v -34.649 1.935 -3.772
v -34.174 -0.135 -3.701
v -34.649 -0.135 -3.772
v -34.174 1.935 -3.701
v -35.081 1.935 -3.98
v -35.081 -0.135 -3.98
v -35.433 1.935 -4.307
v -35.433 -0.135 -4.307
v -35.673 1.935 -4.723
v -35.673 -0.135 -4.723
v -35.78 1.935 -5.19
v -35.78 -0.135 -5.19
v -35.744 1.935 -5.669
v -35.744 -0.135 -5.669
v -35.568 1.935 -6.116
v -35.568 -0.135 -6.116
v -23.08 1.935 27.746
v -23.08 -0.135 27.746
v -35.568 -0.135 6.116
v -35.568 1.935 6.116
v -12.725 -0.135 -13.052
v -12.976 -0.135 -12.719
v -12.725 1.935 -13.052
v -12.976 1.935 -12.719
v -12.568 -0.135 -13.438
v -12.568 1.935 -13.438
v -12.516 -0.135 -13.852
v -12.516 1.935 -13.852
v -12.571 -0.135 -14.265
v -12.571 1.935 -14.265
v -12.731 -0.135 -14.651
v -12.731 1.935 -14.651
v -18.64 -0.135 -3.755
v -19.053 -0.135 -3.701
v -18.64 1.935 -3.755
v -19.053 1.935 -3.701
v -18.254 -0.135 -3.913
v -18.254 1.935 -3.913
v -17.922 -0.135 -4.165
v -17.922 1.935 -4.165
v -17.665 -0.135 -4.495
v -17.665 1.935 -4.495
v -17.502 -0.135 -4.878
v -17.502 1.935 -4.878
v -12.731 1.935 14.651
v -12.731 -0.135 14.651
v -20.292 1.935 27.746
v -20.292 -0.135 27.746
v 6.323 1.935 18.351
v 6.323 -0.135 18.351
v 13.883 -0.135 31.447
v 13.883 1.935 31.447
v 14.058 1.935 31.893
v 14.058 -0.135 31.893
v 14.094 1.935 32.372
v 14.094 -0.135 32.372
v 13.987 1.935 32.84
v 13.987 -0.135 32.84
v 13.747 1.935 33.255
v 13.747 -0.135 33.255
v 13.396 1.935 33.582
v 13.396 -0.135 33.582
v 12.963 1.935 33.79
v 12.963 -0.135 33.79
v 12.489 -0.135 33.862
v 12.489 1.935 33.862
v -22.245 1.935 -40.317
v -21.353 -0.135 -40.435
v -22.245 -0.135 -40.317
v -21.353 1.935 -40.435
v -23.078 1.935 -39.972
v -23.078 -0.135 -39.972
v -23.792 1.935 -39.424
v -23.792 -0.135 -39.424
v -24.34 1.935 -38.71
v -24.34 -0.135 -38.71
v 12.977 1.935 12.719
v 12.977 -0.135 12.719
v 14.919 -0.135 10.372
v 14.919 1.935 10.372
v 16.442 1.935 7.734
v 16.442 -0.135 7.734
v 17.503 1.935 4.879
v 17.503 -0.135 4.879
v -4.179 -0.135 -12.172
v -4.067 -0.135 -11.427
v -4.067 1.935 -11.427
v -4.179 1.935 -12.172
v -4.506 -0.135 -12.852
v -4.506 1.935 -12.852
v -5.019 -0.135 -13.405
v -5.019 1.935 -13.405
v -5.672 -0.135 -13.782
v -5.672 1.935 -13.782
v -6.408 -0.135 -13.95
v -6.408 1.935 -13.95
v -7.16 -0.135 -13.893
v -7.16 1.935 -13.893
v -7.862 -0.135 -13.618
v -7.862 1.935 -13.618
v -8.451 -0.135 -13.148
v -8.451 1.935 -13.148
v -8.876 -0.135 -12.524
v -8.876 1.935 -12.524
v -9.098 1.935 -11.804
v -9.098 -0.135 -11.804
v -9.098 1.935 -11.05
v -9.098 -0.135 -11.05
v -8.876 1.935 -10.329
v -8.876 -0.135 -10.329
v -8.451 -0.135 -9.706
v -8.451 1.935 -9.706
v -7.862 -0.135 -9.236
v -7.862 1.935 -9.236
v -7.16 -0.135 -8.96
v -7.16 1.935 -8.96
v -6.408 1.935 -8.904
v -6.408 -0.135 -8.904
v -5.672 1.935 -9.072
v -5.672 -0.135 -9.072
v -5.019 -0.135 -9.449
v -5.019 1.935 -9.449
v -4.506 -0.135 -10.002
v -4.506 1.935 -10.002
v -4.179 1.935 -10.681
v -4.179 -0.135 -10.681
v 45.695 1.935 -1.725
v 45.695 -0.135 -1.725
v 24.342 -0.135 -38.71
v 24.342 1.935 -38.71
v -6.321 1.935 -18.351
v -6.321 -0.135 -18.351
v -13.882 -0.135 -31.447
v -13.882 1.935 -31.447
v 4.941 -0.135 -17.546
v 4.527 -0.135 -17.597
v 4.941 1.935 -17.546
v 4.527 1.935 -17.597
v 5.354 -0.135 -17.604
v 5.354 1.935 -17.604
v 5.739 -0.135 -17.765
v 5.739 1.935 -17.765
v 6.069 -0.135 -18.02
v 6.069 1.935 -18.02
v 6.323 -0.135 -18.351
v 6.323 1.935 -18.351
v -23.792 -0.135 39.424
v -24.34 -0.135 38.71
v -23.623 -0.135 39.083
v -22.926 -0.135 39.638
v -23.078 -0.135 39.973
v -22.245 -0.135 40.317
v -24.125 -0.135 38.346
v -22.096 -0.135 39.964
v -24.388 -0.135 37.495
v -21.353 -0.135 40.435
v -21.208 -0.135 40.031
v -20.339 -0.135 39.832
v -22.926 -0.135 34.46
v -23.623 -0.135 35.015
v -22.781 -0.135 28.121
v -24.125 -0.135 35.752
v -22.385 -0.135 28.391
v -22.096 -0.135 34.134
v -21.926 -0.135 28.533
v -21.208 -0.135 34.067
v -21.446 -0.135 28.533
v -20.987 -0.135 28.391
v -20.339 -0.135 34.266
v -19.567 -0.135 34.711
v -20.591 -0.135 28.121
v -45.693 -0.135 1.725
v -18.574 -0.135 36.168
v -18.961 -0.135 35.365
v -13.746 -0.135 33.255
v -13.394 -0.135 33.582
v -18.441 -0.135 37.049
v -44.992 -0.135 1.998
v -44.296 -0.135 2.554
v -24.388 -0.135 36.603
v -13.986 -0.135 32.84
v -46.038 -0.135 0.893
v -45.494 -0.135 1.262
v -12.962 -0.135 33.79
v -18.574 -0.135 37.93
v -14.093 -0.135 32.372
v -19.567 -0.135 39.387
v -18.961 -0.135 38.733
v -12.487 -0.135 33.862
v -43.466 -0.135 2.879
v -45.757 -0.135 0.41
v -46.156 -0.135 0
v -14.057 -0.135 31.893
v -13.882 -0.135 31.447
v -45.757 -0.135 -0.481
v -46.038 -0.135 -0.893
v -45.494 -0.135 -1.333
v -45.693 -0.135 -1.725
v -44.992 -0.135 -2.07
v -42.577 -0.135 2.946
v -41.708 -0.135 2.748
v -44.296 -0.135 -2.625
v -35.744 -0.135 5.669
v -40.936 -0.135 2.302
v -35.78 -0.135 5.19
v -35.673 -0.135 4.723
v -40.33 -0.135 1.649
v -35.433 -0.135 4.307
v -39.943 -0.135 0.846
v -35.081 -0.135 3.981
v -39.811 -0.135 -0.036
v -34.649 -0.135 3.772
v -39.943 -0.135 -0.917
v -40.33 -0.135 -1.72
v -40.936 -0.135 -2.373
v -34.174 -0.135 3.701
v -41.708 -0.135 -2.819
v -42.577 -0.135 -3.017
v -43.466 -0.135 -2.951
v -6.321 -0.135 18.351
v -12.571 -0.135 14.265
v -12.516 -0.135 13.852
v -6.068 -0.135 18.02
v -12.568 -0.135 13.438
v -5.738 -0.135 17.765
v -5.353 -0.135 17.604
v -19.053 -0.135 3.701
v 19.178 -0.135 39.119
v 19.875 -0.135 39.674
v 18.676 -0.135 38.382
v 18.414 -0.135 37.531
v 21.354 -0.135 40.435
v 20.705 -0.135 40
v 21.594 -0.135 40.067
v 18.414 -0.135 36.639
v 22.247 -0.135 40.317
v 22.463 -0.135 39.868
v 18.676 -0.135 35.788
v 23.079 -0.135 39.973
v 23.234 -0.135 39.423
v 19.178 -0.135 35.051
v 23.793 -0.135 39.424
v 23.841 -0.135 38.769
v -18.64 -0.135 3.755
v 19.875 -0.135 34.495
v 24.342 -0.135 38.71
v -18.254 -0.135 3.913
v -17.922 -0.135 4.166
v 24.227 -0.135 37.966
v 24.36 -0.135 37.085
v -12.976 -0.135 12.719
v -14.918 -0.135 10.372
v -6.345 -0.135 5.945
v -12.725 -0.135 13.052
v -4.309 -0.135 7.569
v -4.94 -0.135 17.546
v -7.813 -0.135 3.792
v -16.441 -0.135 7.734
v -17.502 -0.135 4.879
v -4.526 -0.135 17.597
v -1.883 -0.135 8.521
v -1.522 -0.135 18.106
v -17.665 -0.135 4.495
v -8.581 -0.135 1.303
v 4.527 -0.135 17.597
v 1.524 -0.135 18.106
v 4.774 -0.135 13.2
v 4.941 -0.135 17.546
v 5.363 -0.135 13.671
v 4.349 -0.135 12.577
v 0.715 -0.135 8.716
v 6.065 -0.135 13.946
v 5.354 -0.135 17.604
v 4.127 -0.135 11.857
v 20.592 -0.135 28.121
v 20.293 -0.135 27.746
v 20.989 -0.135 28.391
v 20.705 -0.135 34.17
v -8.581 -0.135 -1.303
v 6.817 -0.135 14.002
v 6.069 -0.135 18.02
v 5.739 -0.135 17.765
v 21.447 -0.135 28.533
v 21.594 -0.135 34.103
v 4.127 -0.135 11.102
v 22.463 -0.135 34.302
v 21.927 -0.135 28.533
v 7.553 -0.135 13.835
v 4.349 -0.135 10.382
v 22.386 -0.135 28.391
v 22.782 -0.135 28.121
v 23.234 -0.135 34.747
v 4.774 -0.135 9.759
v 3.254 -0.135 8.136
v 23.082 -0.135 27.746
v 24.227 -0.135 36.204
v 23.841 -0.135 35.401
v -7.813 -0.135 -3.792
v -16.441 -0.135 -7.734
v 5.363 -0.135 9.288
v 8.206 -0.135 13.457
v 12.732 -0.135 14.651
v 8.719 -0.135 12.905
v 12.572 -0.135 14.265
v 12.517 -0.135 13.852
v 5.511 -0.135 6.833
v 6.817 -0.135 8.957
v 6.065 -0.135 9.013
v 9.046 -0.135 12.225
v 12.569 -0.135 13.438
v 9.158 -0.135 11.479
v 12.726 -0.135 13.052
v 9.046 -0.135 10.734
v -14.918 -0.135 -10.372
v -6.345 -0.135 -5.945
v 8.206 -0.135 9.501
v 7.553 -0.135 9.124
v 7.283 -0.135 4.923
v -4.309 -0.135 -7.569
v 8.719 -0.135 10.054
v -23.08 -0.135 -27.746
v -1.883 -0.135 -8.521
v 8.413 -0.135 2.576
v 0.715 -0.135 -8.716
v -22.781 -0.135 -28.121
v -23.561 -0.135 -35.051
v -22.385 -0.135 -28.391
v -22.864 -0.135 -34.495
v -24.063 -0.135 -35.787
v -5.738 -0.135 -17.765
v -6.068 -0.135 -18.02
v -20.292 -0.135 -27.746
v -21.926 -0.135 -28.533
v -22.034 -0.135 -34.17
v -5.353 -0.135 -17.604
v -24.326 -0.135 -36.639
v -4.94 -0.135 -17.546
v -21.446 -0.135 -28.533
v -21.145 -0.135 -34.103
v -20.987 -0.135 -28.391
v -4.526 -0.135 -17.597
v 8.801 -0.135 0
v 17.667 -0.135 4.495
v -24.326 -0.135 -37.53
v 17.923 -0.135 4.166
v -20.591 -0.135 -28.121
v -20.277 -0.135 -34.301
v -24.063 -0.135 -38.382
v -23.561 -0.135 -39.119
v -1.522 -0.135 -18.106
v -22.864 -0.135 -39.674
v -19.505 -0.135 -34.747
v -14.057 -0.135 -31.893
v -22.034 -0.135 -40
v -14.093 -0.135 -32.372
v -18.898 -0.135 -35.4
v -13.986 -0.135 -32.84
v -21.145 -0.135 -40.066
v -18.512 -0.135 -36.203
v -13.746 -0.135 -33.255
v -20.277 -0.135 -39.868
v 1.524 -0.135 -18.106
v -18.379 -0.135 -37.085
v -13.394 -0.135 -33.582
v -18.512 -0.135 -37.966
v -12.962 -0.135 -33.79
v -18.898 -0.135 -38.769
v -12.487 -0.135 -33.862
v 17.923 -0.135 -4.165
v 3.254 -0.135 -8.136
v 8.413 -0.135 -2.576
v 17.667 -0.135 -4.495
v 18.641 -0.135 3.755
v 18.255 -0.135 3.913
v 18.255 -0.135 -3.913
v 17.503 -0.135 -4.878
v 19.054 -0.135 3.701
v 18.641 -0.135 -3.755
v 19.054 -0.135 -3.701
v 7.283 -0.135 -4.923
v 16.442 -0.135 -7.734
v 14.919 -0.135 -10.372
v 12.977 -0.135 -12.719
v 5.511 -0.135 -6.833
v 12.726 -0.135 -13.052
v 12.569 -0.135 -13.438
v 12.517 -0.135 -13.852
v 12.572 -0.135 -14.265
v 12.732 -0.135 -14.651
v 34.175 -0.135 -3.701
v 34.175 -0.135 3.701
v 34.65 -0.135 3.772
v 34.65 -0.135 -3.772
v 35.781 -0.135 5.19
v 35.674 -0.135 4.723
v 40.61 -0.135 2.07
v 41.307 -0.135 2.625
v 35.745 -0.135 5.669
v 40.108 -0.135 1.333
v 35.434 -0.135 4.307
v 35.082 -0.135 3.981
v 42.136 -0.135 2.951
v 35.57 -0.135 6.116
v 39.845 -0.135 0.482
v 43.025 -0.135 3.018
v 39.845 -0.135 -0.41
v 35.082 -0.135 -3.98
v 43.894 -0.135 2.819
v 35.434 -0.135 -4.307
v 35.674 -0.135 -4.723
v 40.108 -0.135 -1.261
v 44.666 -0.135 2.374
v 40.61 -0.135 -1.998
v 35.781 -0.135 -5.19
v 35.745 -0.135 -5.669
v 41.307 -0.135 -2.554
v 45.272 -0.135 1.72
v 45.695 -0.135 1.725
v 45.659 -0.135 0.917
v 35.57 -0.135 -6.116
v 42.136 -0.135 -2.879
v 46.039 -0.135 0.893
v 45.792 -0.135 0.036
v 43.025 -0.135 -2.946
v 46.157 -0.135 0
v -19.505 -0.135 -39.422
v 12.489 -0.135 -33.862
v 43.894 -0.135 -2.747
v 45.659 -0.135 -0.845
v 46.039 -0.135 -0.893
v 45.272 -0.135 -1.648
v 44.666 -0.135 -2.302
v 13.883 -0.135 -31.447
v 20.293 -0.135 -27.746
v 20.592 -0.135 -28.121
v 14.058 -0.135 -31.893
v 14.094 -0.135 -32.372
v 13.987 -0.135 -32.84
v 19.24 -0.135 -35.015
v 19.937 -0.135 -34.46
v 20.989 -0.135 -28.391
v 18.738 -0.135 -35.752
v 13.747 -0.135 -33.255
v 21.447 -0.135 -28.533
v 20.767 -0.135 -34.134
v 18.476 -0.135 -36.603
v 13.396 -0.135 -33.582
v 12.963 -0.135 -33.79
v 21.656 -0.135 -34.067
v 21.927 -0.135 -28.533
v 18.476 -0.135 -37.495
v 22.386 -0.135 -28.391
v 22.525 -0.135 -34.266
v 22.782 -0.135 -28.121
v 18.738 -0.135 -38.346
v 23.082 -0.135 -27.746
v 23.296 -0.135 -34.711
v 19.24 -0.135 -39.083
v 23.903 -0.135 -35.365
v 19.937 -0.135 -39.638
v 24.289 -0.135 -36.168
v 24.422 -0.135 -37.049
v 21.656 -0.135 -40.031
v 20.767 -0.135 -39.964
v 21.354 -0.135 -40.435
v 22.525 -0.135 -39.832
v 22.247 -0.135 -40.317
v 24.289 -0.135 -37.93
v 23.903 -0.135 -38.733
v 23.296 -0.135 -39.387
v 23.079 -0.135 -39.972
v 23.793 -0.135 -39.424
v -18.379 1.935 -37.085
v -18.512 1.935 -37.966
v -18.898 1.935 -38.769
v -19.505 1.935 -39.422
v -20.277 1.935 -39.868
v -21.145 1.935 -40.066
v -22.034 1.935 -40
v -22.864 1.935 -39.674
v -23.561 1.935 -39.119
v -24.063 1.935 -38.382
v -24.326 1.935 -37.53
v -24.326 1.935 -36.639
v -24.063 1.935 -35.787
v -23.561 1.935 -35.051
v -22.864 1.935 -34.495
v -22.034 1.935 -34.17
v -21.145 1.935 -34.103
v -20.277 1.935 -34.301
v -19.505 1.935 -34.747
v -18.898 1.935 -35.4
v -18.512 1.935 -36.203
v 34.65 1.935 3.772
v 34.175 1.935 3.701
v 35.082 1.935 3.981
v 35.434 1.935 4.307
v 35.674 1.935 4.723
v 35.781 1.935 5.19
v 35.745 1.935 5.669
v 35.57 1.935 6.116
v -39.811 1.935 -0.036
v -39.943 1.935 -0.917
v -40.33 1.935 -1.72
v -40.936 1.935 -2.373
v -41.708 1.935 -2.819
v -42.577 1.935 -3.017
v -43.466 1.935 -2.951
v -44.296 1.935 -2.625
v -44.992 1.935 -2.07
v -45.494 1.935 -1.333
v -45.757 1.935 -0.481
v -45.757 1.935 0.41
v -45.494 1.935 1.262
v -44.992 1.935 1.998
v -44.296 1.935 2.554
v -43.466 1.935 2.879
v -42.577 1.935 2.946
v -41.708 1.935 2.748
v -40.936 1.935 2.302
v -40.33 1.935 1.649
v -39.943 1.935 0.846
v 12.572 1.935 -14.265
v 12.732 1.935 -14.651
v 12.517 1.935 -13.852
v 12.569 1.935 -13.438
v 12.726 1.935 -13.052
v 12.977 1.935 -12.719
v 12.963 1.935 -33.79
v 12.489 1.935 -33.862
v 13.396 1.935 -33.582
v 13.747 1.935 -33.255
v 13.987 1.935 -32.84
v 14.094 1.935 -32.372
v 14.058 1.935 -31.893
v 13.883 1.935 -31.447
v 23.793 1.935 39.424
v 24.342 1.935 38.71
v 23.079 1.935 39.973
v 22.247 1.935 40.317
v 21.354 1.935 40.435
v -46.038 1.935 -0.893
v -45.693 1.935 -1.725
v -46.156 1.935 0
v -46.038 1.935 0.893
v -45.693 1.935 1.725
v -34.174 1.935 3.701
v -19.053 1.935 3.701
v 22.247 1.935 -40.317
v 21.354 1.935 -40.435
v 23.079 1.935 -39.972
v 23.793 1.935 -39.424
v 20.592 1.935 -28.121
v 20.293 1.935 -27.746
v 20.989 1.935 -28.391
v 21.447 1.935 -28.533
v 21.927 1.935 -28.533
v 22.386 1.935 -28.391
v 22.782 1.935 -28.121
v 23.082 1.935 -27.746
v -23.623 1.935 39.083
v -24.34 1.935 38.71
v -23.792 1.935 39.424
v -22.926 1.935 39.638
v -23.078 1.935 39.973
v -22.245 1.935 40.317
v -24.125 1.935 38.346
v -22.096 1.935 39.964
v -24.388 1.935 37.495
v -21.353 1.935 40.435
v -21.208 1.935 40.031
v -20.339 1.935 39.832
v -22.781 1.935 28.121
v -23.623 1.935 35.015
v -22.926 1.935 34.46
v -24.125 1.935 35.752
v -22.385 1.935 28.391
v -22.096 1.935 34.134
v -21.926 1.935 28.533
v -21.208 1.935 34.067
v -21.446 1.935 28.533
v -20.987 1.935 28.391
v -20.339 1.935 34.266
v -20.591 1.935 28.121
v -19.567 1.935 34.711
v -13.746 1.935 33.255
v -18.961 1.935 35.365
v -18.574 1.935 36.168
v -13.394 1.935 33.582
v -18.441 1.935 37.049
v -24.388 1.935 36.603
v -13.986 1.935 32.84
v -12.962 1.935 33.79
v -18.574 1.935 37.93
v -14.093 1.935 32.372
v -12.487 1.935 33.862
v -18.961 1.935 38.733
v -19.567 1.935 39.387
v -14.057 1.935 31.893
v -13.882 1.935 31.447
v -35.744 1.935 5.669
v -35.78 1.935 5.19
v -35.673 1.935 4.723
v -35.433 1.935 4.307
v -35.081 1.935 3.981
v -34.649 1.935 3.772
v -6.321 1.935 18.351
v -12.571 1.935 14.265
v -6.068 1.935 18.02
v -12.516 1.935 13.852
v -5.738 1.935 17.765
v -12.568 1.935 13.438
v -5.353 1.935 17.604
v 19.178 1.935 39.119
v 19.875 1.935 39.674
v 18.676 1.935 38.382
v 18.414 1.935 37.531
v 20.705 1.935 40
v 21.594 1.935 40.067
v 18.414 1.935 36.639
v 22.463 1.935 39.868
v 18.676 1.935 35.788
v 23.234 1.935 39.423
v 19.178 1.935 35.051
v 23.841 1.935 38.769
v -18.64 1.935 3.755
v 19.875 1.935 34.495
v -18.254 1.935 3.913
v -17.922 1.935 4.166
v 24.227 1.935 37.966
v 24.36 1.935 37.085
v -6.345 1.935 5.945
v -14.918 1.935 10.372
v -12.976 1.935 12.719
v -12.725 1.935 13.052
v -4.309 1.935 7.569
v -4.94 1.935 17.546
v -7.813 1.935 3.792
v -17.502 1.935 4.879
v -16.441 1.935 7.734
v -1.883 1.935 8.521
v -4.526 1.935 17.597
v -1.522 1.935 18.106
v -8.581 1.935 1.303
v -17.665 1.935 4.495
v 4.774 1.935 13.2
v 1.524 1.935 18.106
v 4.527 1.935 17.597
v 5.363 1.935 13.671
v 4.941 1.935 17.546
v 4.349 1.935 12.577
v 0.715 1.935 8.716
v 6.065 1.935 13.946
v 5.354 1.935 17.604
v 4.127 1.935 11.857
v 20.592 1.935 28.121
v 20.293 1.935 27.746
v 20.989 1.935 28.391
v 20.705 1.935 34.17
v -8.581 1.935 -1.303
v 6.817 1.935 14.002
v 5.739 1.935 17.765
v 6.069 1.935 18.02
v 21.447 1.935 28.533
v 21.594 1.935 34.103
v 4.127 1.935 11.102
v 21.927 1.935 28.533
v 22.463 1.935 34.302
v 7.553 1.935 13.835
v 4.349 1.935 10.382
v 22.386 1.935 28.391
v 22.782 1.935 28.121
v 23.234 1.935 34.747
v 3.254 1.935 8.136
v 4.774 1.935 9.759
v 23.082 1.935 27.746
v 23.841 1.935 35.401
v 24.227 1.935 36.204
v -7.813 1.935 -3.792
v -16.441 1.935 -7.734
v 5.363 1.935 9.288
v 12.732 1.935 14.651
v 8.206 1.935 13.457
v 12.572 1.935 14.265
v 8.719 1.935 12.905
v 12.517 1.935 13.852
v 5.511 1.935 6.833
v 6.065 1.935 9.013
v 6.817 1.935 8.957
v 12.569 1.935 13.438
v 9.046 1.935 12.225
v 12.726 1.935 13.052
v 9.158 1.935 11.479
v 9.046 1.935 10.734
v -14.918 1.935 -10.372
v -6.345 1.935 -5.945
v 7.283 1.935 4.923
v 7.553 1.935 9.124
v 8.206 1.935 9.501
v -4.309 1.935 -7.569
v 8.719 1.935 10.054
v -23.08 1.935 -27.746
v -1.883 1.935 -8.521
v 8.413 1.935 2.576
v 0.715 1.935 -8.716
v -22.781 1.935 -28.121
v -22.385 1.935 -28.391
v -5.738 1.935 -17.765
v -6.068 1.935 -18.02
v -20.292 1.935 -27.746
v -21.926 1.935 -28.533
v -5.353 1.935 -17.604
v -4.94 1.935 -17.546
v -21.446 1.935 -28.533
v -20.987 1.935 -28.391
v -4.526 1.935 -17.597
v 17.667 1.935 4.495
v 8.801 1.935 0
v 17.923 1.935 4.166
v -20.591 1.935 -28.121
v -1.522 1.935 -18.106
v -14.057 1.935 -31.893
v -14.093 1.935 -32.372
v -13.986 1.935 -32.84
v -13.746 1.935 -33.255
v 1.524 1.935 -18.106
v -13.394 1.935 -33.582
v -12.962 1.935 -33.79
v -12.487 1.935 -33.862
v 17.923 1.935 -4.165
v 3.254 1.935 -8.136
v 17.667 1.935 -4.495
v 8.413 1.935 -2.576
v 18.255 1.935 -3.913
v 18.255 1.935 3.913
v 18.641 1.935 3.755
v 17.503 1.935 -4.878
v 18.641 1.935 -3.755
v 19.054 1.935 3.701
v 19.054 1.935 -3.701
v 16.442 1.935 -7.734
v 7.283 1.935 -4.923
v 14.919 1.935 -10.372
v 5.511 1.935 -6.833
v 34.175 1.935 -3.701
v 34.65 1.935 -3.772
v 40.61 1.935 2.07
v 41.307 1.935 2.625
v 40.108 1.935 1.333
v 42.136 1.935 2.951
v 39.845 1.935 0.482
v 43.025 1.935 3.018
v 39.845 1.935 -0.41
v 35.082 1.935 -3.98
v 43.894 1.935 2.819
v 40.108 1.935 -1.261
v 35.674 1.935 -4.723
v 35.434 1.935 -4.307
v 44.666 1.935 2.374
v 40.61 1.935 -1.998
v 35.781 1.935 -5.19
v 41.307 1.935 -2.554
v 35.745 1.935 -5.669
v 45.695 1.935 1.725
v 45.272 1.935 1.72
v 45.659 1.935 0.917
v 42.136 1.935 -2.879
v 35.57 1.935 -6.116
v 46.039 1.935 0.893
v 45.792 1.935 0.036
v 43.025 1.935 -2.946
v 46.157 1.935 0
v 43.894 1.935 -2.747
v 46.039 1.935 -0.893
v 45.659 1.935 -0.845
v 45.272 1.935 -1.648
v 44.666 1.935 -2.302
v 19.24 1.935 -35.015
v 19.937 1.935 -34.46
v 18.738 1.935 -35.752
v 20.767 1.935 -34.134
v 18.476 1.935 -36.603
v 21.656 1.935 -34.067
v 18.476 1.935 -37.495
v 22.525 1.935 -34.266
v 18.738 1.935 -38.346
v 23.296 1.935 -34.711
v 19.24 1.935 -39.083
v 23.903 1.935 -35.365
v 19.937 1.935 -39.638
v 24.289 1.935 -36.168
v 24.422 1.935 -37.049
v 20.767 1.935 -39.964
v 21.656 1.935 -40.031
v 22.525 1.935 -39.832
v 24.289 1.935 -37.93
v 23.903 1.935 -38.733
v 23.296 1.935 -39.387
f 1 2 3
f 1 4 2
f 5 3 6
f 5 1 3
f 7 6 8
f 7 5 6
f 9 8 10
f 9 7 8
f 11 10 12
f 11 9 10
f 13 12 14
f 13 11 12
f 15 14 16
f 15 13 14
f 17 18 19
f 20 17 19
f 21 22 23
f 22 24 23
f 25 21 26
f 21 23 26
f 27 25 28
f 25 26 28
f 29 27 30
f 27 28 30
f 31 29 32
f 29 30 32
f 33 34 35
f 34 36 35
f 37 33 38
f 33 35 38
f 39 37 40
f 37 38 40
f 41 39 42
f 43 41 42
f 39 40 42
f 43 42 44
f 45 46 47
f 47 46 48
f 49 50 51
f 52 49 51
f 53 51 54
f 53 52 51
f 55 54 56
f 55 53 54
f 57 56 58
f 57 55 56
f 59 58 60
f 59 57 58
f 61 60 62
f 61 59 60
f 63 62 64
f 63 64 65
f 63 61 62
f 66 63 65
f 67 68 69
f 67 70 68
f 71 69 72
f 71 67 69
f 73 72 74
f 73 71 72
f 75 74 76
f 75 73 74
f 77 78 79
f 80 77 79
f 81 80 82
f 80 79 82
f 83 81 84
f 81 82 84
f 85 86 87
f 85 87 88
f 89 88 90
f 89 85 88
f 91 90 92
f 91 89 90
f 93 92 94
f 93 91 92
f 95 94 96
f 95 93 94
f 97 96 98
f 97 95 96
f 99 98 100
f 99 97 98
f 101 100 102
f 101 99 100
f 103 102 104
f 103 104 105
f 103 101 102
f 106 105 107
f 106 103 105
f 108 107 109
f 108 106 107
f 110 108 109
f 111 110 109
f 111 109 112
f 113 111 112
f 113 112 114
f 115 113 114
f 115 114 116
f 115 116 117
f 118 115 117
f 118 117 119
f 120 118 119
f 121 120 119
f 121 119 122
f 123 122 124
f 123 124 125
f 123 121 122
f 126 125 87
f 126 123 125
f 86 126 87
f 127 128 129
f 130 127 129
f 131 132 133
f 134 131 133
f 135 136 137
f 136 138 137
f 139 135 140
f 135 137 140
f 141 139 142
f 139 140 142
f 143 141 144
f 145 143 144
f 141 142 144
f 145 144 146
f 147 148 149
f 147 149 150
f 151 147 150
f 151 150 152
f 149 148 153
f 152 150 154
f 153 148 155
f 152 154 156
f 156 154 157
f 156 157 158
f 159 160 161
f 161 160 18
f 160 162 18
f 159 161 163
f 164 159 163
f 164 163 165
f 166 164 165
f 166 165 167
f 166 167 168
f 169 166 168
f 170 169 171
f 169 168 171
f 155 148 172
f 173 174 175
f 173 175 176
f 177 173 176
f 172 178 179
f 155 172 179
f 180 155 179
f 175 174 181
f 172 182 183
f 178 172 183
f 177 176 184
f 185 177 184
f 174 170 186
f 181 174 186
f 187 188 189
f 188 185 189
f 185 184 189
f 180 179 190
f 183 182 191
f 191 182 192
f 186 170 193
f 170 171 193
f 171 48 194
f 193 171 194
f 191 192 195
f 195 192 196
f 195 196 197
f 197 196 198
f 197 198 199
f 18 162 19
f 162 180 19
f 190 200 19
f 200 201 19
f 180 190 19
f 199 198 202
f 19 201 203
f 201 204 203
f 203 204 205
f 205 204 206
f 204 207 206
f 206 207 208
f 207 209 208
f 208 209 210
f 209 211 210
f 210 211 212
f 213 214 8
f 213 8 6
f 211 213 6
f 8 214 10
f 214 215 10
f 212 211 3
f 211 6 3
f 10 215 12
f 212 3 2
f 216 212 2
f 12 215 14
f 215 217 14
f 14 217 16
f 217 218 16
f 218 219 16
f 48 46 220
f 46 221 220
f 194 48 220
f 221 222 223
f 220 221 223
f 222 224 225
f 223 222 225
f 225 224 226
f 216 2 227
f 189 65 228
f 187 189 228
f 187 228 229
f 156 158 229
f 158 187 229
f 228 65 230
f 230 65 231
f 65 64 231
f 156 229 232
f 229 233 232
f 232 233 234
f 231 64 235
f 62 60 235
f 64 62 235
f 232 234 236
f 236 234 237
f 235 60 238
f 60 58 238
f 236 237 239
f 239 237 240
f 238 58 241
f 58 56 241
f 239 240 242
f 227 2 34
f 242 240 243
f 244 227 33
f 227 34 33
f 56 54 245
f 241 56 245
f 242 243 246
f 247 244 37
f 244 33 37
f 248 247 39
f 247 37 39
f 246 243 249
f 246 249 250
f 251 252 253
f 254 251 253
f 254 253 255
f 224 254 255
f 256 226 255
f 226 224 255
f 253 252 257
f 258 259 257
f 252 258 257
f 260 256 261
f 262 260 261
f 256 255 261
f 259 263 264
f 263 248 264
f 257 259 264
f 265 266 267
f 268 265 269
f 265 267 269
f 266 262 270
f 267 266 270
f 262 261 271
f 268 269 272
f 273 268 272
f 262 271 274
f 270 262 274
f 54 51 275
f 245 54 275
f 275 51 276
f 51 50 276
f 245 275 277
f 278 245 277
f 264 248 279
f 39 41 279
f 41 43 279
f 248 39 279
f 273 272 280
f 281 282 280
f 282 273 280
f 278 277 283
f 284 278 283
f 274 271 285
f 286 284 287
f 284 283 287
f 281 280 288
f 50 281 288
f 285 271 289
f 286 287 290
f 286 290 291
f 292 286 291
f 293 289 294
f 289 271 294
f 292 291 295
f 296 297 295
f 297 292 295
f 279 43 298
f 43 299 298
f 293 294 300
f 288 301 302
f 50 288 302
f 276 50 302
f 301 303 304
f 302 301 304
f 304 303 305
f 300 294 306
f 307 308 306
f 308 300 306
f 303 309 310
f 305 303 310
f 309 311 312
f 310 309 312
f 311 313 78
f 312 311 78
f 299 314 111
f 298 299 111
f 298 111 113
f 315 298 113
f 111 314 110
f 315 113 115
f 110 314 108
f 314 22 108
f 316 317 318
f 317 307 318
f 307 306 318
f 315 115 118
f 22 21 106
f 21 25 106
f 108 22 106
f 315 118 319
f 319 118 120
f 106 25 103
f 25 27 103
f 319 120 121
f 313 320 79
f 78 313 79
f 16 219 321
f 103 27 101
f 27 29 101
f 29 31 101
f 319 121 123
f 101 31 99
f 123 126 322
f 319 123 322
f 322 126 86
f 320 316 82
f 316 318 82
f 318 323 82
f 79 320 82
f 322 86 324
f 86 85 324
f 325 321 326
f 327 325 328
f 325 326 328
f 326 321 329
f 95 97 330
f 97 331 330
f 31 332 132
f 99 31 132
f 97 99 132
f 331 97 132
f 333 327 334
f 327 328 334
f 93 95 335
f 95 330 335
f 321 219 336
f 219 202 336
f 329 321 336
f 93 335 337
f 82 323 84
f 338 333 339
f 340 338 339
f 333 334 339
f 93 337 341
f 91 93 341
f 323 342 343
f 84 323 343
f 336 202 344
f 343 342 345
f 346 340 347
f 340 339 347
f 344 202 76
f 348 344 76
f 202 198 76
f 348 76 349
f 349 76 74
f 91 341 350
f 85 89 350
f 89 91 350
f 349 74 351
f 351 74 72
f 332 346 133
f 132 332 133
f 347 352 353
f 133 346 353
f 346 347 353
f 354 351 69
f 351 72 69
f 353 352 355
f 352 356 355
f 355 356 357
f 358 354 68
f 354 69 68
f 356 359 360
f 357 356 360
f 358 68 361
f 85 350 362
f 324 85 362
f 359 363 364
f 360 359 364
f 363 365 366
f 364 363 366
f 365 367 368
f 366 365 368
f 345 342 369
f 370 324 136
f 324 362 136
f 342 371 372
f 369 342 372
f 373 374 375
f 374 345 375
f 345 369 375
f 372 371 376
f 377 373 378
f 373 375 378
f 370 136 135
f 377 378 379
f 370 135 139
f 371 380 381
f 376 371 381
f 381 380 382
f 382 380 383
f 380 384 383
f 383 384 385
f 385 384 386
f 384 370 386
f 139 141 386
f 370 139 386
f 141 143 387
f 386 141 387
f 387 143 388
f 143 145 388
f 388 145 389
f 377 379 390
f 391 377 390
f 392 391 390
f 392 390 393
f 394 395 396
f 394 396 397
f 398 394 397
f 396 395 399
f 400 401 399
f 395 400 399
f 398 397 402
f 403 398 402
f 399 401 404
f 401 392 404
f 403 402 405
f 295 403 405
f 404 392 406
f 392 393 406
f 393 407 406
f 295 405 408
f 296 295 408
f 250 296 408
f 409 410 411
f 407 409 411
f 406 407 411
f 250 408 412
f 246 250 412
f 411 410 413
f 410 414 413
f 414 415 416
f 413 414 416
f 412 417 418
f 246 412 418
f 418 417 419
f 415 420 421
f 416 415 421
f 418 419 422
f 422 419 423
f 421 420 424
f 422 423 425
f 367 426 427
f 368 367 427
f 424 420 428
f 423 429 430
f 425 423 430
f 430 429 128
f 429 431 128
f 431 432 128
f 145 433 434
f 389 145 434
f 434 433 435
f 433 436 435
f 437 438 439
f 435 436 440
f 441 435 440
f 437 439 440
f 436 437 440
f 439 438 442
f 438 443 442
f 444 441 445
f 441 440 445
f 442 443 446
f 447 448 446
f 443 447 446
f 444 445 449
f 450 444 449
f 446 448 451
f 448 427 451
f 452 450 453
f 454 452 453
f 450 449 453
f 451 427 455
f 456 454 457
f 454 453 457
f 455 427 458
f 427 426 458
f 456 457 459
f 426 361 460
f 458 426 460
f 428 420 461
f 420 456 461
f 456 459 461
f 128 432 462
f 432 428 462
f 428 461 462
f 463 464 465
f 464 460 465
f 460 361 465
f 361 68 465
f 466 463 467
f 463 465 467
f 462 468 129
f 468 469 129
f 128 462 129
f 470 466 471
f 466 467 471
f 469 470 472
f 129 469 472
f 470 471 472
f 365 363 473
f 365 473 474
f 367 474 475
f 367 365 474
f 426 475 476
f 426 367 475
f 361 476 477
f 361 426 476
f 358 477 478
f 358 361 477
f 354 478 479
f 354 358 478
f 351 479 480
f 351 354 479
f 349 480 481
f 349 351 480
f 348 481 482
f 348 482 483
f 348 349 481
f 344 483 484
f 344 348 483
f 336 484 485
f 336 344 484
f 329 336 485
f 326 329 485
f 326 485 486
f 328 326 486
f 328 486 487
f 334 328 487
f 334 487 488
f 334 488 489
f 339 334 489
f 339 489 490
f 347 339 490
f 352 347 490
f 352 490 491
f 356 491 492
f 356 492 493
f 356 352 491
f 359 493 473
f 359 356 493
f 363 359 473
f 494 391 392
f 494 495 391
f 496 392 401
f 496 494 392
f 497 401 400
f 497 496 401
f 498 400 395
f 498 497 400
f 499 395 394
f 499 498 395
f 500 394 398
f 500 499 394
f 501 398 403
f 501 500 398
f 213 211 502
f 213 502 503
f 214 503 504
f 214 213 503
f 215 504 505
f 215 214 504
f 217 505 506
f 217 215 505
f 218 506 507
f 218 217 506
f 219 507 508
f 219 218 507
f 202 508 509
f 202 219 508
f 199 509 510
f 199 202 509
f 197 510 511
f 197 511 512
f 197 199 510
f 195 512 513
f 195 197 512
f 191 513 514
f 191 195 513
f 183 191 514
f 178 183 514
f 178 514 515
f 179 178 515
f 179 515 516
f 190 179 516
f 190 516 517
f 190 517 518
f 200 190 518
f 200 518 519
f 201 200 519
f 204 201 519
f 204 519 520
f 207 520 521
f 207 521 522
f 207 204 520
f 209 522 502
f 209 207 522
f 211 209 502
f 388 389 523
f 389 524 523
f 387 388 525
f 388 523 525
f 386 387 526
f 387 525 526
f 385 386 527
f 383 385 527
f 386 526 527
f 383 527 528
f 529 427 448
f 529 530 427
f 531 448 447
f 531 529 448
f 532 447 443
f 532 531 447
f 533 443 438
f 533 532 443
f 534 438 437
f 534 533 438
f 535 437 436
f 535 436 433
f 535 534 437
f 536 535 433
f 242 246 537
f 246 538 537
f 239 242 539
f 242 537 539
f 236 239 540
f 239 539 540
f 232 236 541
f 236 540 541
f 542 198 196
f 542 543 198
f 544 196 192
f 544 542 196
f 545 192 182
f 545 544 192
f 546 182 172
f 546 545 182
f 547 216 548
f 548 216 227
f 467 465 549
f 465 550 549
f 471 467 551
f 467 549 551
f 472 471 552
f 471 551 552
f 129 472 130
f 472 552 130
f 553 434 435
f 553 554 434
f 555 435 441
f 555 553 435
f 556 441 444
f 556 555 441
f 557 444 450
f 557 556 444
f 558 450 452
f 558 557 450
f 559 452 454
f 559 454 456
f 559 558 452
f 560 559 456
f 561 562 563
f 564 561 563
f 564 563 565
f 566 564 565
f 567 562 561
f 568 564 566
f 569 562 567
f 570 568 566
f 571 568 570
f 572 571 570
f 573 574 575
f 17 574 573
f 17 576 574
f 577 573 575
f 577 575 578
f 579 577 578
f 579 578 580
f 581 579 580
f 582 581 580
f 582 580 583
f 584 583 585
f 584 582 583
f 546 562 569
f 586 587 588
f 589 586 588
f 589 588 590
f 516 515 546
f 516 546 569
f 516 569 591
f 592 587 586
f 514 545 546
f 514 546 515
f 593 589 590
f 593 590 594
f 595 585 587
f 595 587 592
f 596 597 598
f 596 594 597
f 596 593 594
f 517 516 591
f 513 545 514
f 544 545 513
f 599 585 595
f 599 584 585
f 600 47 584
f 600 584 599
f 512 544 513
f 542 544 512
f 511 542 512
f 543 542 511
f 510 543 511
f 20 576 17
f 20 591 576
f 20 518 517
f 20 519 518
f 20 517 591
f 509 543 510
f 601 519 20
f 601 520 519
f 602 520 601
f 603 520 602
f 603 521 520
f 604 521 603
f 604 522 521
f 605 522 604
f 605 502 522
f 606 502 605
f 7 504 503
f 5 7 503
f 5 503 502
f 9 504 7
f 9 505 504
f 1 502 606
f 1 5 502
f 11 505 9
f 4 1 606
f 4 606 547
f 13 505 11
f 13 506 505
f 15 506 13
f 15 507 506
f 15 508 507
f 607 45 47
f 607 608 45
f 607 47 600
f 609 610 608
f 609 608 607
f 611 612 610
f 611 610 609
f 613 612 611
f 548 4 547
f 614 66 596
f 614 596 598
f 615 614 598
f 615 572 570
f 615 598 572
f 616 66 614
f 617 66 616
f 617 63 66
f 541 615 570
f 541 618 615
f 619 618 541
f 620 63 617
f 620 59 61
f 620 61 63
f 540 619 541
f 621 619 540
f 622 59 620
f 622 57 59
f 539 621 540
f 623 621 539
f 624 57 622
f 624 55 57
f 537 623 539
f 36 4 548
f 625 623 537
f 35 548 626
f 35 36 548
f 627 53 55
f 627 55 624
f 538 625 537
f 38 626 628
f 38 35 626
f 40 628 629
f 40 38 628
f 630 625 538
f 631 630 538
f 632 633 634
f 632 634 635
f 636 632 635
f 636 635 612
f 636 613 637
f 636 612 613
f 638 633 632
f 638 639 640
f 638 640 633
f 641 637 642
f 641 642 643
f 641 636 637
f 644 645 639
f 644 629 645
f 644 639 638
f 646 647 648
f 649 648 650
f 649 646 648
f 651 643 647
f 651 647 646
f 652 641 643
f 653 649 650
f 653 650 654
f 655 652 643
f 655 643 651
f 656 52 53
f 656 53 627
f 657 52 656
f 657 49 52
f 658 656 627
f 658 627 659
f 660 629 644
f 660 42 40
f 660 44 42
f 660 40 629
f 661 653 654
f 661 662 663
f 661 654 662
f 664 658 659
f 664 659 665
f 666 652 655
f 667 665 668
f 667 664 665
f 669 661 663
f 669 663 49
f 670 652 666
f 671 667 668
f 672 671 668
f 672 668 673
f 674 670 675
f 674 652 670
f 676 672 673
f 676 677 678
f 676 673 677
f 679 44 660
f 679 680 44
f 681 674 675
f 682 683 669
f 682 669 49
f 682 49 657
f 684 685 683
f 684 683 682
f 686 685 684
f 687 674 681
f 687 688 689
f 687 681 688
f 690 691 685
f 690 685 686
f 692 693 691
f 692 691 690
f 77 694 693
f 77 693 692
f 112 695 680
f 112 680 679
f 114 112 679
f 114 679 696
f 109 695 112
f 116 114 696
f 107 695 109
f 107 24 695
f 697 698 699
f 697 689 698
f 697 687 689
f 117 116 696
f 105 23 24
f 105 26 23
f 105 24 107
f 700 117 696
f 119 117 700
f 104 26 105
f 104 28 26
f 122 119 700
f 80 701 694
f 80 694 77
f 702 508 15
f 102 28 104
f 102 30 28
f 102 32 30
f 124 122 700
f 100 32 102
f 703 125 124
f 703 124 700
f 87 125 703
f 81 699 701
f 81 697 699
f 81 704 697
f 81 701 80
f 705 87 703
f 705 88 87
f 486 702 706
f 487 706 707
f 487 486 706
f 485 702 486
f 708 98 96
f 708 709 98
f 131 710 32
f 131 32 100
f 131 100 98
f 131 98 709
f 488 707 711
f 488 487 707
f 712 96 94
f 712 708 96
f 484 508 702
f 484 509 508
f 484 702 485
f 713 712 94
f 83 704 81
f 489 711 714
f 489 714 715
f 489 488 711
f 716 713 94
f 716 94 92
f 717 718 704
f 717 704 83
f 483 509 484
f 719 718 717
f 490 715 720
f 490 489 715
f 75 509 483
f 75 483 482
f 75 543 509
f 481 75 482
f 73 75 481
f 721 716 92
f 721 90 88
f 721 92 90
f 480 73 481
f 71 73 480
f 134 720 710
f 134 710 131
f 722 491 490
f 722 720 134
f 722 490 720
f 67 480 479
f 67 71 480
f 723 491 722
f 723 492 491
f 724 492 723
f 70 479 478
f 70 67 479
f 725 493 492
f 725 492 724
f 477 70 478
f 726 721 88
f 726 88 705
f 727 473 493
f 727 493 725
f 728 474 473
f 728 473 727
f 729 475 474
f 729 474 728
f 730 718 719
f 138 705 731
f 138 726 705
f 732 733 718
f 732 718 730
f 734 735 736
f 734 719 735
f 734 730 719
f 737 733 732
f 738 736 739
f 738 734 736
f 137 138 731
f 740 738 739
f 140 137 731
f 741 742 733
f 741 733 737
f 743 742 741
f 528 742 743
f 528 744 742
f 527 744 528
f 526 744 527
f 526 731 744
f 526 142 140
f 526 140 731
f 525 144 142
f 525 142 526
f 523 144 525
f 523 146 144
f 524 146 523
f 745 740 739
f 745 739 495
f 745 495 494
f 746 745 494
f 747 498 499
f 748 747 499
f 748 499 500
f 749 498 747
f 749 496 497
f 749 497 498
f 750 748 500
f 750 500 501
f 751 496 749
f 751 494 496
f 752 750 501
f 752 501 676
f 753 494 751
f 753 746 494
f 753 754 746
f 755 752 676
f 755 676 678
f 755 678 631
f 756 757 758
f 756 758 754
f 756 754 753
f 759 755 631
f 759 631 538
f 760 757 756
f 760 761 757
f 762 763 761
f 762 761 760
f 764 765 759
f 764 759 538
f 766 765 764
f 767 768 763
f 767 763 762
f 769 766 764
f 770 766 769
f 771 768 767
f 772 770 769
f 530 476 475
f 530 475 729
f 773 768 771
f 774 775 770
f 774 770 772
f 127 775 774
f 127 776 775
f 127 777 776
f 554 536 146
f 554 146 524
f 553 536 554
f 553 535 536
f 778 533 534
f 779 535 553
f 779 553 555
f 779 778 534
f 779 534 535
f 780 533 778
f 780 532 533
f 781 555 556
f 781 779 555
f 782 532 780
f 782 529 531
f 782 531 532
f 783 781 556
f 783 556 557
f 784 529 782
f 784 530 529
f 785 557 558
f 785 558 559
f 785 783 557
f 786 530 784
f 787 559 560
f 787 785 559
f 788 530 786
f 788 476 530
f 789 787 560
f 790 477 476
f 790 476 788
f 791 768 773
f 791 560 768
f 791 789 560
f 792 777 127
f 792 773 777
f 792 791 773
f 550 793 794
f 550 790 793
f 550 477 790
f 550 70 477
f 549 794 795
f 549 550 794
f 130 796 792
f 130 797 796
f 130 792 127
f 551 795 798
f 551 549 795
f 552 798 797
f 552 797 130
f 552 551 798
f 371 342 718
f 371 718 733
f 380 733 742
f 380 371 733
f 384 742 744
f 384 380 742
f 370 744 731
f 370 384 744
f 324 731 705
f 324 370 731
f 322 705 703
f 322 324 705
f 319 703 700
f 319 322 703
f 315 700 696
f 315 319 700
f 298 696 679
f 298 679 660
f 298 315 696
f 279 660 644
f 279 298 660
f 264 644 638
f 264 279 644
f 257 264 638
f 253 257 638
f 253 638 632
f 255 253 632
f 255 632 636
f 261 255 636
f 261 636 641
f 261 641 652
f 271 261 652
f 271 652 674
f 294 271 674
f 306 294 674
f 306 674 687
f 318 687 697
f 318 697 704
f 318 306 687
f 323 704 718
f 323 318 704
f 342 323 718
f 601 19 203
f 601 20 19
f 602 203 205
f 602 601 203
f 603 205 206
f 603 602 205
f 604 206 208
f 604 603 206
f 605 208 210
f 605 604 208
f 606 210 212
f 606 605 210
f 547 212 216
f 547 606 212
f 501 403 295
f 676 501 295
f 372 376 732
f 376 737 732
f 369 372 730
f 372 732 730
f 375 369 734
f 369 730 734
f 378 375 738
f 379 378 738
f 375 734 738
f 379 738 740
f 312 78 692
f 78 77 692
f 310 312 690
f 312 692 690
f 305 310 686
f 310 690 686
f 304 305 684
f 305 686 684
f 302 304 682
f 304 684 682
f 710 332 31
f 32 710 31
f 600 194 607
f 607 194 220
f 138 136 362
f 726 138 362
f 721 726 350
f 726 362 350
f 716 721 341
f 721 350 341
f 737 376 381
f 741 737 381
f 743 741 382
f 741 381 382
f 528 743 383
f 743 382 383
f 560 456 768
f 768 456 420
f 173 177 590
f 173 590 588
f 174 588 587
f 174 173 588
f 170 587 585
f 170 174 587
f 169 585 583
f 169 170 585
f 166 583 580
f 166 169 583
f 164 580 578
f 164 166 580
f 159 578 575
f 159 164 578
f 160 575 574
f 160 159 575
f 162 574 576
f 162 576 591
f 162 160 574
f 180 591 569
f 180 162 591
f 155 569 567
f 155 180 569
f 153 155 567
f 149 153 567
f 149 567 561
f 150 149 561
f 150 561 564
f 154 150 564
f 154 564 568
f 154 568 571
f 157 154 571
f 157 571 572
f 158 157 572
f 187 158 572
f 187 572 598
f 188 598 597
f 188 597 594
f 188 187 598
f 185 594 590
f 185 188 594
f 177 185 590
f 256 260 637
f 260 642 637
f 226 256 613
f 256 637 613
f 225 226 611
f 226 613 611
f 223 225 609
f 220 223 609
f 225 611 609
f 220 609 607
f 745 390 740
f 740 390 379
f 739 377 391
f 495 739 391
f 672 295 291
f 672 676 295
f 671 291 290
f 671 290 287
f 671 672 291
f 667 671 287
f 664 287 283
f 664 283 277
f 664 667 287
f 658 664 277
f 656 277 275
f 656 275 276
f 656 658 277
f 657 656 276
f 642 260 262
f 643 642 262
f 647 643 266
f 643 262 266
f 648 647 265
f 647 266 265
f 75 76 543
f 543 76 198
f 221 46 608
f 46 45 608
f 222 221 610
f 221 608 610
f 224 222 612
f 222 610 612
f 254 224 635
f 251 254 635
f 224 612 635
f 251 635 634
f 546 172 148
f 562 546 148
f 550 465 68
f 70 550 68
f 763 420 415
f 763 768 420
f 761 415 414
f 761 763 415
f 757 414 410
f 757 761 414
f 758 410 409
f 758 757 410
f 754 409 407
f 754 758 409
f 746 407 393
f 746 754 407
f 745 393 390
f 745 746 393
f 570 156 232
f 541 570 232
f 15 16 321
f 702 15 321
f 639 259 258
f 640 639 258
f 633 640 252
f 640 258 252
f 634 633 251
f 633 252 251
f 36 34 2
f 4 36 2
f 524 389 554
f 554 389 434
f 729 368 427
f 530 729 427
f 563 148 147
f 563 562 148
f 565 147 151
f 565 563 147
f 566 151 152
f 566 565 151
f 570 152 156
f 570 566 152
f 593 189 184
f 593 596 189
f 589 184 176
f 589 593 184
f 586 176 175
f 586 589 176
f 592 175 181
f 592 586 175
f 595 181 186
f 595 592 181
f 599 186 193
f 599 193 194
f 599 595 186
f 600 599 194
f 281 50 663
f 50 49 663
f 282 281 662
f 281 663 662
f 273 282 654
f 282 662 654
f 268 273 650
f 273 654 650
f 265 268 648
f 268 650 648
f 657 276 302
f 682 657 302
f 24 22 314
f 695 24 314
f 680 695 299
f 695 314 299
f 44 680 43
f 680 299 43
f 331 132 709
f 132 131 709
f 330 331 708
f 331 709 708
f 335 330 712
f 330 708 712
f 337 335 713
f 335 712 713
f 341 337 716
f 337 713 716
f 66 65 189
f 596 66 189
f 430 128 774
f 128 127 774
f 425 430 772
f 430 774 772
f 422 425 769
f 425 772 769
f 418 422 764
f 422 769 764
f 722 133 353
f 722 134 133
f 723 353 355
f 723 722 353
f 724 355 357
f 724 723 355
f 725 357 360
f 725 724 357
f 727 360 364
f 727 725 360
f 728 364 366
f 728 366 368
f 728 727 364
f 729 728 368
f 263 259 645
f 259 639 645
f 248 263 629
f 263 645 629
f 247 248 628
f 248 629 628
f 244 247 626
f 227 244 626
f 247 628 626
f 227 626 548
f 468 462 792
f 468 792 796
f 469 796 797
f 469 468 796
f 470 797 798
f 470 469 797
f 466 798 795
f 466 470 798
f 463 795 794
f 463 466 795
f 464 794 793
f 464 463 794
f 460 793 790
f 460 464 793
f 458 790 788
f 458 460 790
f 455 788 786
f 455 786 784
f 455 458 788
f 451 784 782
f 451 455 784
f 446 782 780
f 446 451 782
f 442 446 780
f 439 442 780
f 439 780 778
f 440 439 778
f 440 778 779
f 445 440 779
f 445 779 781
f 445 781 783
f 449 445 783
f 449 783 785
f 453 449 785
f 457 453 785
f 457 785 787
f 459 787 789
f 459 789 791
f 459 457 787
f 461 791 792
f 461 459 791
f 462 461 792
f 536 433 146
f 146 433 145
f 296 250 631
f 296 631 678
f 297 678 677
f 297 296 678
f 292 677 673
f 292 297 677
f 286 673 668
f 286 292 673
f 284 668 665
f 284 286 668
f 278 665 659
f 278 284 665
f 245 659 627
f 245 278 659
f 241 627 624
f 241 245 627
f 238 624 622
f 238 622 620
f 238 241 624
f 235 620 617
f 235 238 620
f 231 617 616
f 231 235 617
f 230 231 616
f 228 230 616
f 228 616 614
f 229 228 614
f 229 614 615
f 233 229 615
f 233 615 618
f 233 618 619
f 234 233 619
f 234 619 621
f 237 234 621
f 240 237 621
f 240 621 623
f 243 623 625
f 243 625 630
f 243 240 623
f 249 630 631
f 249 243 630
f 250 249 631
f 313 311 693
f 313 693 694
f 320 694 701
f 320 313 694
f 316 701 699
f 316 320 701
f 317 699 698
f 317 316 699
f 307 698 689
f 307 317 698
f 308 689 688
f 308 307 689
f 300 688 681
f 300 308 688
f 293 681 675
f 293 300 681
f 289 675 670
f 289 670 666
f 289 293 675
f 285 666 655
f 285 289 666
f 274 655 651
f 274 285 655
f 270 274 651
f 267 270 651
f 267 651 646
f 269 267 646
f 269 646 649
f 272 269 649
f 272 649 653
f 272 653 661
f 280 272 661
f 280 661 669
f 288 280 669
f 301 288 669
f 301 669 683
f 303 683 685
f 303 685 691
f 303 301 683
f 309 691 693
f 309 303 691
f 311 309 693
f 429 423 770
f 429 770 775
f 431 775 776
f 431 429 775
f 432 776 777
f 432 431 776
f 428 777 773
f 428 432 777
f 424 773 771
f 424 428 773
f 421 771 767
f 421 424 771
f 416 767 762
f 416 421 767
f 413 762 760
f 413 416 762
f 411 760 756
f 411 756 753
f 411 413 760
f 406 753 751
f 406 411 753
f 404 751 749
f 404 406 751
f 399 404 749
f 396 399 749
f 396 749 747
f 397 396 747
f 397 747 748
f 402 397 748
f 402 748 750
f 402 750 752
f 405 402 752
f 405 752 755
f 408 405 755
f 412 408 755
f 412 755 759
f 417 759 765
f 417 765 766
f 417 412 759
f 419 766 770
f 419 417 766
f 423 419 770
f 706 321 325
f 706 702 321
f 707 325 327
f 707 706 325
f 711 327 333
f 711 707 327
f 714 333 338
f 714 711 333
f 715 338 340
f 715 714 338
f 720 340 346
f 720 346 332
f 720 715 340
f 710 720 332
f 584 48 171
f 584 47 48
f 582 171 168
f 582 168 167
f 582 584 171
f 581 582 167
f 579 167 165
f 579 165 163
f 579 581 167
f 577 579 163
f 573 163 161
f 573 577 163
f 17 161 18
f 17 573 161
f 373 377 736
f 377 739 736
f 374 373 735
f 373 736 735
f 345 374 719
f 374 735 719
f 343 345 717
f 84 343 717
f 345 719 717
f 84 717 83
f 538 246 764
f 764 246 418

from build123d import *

# Parameters (mm, degrees)
SKETCH1_R           = 2.6
SKETCH1_R_2         = 2.2
SKETCH1_R_3         = 7.6
BOSS_EXTRUDE1_DEPTH = 1.8
FILLET1_R           = 3
FILLET2_R           = 1.4
SCALE1_SCALE        = 1.15


with BuildPart() as part:
    # Sketch1 → Boss-Extrude1 (new body)
    with BuildSketch(Plane(origin=(0, 0, 0), x_dir=(1, 0, 0), z_dir=(0, 1, 0))):
        Polygon((20.3, 35.160631394), (-20.3, 35.160631394), (-40.6, 0), (-20.3, -35.160631394), (20.3, -35.160631394), (40.6, 0), align=None)
        with Locations((-18.636201283, -32.21652123)):
            Circle(SKETCH1_R, mode=Mode.SUBTRACT)
        with Locations((18.582225165, -32.247684356)):
            Circle(SKETCH1_R, mode=Mode.SUBTRACT)
        with Locations((37.218426448, -0.031163126)):
            Circle(SKETCH1_R, mode=Mode.SUBTRACT)
        with Locations((-37.218426448, 0.031163126)):
            Circle(SKETCH1_R, mode=Mode.SUBTRACT)
        with BuildLine():
            Line((-32.142053523, 3.218057696), (-18.857946477, 26.226806032))
            Line((-18.857946477, 26.226806032), (-10.521325069, 11.78735419))
            ThreePointArc((-10.521325069, 11.78735419), (-13.68320138, 7.9), (-15.468810706, 3.218057696))
            Line((-15.468810706, 3.218057696), (-32.142053523, 3.218057696))
        make_face(mode=Mode.SUBTRACT)
        with BuildLine():
            Line((-18.857946477, -26.226806032), (-32.142053523, -3.218057696))
            Line((-32.142053523, -3.218057696), (-15.468810706, -3.218057696))
            ThreePointArc((-15.468810706, -3.218057696), (-13.68320138, -7.9), (-10.521325069, -11.78735419))
            Line((-10.521325069, -11.78735419), (-18.857946477, -26.226806032))
        make_face(mode=Mode.SUBTRACT)
        with BuildLine():
            Line((13.284107046, -29.444863729), (-13.284107046, -29.444863729))
            Line((-13.284107046, -29.444863729), (-4.947485637, -15.005411886))
            ThreePointArc((-4.947485637, -15.005411886), (0, -15.8), (4.947485637, -15.005411886))
            Line((4.947485637, -15.005411886), (13.284107046, -29.444863729))
        make_face(mode=Mode.SUBTRACT)
        with BuildLine():
            Line((32.142053523, -3.218057696), (18.857946477, -26.226806032))
            Line((18.857946477, -26.226806032), (10.521325069, -11.78735419))
            ThreePointArc((10.521325069, -11.78735419), (13.68320138, -7.9), (15.468810706, -3.218057696))
            Line((15.468810706, -3.218057696), (32.142053523, -3.218057696))
        make_face(mode=Mode.SUBTRACT)
        with BuildLine():
            Line((18.857946477, 26.226806032), (32.142053523, 3.218057696))
            Line((32.142053523, 3.218057696), (15.468810706, 3.218057696))
            ThreePointArc((15.468810706, 3.218057696), (13.68320138, 7.9), (10.521325069, 11.78735419))
            Line((10.521325069, 11.78735419), (18.857946477, 26.226806032))
        make_face(mode=Mode.SUBTRACT)
        with BuildLine():
            Line((-13.284107046, 29.444863729), (13.284107046, 29.444863729))
            Line((13.284107046, 29.444863729), (4.947485637, 15.005411886))
            ThreePointArc((4.947485637, 15.005411886), (0, 15.8), (-4.947485637, 15.005411886))
            Line((-4.947485637, 15.005411886), (-13.284107046, 29.444863729))
        make_face(mode=Mode.SUBTRACT)
        with Locations((-18.582225165, 32.247684356)):
            Circle(SKETCH1_R, mode=Mode.SUBTRACT)
        with Locations((18.636201283, 32.21652123)):
            Circle(SKETCH1_R, mode=Mode.SUBTRACT)
        with Locations((5.763168727, -9.982101048)):
            Circle(SKETCH1_R_2, mode=Mode.SUBTRACT)
        with Locations((-5.736740168, 9.936325441)):
            Circle(SKETCH1_R_2, mode=Mode.SUBTRACT)
        with Locations((0.052857117, 0)):
            Circle(SKETCH1_R_3, mode=Mode.SUBTRACT)
    extrude(amount=BOSS_EXTRUDE1_DEPTH)

    # Fillet1
    fillet1_edges = [part.edges().sort_by_distance(p)[0] for p in [
        (40.6, 0.9, 0),
        (20.3, 0.9, 35.160631394),
        (-20.3, 0.9, 35.160631394),
        (-40.6, 0.9, 0),
        (-20.3, 0.9, -35.160631394),
        (20.3, 0.9, -35.160631394),
    ]]
    fillet(fillet1_edges, radius=FILLET1_R)

    # Fillet2
    fillet2_edges = [part.edges().sort_by_distance(p)[0] for p in [
        (-32.142053523, 0.9, -3.218057696),
        (-15.468810706, 0.9, -3.218057696),
        (-10.521325069, 0.9, -11.78735419),
        (-18.857946477, 0.9, -26.226806032),
        (-18.857946477, 0.9, 26.226806032),
        (-10.521325069, 0.9, 11.78735419),
        (-15.468810706, 0.9, 3.218057696),
        (-32.142053523, 0.9, 3.218057696),
        (13.284107046, 0.9, 29.444863729),
        (4.947485637, 0.9, 15.005411886),
        (-4.947485637, 0.9, 15.005411886),
        (-13.284107046, 0.9, 29.444863729),
        (32.142053523, 0.9, 3.218057696),
        (15.468810706, 0.9, 3.218057696),
        (10.521325069, 0.9, 11.78735419),
        (18.857946477, 0.9, 26.226806032),
        (18.857946477, 0.9, -26.226806032),
        (10.521325069, 0.9, -11.78735419),
        (15.468810706, 0.9, -3.218057696),
        (32.142053523, 0.9, -3.218057696),
        (-13.284107046, 0.9, -29.444863729),
        (-4.947485637, 0.9, -15.005411886),
        (4.947485637, 0.9, -15.005411886),
        (13.284107046, 0.9, -29.444863729),
    ]]
    fillet(fillet2_edges, radius=FILLET2_R)


with BuildPart() as part_1:
    # Scale1: scaled about (-0.004144331, 0.9, -0.000288654)
    add(part.part.scale(SCALE1_SCALE).moved(Location((0.00062165, -0.135, 4.3298e-05))))


solid = part_1.part
